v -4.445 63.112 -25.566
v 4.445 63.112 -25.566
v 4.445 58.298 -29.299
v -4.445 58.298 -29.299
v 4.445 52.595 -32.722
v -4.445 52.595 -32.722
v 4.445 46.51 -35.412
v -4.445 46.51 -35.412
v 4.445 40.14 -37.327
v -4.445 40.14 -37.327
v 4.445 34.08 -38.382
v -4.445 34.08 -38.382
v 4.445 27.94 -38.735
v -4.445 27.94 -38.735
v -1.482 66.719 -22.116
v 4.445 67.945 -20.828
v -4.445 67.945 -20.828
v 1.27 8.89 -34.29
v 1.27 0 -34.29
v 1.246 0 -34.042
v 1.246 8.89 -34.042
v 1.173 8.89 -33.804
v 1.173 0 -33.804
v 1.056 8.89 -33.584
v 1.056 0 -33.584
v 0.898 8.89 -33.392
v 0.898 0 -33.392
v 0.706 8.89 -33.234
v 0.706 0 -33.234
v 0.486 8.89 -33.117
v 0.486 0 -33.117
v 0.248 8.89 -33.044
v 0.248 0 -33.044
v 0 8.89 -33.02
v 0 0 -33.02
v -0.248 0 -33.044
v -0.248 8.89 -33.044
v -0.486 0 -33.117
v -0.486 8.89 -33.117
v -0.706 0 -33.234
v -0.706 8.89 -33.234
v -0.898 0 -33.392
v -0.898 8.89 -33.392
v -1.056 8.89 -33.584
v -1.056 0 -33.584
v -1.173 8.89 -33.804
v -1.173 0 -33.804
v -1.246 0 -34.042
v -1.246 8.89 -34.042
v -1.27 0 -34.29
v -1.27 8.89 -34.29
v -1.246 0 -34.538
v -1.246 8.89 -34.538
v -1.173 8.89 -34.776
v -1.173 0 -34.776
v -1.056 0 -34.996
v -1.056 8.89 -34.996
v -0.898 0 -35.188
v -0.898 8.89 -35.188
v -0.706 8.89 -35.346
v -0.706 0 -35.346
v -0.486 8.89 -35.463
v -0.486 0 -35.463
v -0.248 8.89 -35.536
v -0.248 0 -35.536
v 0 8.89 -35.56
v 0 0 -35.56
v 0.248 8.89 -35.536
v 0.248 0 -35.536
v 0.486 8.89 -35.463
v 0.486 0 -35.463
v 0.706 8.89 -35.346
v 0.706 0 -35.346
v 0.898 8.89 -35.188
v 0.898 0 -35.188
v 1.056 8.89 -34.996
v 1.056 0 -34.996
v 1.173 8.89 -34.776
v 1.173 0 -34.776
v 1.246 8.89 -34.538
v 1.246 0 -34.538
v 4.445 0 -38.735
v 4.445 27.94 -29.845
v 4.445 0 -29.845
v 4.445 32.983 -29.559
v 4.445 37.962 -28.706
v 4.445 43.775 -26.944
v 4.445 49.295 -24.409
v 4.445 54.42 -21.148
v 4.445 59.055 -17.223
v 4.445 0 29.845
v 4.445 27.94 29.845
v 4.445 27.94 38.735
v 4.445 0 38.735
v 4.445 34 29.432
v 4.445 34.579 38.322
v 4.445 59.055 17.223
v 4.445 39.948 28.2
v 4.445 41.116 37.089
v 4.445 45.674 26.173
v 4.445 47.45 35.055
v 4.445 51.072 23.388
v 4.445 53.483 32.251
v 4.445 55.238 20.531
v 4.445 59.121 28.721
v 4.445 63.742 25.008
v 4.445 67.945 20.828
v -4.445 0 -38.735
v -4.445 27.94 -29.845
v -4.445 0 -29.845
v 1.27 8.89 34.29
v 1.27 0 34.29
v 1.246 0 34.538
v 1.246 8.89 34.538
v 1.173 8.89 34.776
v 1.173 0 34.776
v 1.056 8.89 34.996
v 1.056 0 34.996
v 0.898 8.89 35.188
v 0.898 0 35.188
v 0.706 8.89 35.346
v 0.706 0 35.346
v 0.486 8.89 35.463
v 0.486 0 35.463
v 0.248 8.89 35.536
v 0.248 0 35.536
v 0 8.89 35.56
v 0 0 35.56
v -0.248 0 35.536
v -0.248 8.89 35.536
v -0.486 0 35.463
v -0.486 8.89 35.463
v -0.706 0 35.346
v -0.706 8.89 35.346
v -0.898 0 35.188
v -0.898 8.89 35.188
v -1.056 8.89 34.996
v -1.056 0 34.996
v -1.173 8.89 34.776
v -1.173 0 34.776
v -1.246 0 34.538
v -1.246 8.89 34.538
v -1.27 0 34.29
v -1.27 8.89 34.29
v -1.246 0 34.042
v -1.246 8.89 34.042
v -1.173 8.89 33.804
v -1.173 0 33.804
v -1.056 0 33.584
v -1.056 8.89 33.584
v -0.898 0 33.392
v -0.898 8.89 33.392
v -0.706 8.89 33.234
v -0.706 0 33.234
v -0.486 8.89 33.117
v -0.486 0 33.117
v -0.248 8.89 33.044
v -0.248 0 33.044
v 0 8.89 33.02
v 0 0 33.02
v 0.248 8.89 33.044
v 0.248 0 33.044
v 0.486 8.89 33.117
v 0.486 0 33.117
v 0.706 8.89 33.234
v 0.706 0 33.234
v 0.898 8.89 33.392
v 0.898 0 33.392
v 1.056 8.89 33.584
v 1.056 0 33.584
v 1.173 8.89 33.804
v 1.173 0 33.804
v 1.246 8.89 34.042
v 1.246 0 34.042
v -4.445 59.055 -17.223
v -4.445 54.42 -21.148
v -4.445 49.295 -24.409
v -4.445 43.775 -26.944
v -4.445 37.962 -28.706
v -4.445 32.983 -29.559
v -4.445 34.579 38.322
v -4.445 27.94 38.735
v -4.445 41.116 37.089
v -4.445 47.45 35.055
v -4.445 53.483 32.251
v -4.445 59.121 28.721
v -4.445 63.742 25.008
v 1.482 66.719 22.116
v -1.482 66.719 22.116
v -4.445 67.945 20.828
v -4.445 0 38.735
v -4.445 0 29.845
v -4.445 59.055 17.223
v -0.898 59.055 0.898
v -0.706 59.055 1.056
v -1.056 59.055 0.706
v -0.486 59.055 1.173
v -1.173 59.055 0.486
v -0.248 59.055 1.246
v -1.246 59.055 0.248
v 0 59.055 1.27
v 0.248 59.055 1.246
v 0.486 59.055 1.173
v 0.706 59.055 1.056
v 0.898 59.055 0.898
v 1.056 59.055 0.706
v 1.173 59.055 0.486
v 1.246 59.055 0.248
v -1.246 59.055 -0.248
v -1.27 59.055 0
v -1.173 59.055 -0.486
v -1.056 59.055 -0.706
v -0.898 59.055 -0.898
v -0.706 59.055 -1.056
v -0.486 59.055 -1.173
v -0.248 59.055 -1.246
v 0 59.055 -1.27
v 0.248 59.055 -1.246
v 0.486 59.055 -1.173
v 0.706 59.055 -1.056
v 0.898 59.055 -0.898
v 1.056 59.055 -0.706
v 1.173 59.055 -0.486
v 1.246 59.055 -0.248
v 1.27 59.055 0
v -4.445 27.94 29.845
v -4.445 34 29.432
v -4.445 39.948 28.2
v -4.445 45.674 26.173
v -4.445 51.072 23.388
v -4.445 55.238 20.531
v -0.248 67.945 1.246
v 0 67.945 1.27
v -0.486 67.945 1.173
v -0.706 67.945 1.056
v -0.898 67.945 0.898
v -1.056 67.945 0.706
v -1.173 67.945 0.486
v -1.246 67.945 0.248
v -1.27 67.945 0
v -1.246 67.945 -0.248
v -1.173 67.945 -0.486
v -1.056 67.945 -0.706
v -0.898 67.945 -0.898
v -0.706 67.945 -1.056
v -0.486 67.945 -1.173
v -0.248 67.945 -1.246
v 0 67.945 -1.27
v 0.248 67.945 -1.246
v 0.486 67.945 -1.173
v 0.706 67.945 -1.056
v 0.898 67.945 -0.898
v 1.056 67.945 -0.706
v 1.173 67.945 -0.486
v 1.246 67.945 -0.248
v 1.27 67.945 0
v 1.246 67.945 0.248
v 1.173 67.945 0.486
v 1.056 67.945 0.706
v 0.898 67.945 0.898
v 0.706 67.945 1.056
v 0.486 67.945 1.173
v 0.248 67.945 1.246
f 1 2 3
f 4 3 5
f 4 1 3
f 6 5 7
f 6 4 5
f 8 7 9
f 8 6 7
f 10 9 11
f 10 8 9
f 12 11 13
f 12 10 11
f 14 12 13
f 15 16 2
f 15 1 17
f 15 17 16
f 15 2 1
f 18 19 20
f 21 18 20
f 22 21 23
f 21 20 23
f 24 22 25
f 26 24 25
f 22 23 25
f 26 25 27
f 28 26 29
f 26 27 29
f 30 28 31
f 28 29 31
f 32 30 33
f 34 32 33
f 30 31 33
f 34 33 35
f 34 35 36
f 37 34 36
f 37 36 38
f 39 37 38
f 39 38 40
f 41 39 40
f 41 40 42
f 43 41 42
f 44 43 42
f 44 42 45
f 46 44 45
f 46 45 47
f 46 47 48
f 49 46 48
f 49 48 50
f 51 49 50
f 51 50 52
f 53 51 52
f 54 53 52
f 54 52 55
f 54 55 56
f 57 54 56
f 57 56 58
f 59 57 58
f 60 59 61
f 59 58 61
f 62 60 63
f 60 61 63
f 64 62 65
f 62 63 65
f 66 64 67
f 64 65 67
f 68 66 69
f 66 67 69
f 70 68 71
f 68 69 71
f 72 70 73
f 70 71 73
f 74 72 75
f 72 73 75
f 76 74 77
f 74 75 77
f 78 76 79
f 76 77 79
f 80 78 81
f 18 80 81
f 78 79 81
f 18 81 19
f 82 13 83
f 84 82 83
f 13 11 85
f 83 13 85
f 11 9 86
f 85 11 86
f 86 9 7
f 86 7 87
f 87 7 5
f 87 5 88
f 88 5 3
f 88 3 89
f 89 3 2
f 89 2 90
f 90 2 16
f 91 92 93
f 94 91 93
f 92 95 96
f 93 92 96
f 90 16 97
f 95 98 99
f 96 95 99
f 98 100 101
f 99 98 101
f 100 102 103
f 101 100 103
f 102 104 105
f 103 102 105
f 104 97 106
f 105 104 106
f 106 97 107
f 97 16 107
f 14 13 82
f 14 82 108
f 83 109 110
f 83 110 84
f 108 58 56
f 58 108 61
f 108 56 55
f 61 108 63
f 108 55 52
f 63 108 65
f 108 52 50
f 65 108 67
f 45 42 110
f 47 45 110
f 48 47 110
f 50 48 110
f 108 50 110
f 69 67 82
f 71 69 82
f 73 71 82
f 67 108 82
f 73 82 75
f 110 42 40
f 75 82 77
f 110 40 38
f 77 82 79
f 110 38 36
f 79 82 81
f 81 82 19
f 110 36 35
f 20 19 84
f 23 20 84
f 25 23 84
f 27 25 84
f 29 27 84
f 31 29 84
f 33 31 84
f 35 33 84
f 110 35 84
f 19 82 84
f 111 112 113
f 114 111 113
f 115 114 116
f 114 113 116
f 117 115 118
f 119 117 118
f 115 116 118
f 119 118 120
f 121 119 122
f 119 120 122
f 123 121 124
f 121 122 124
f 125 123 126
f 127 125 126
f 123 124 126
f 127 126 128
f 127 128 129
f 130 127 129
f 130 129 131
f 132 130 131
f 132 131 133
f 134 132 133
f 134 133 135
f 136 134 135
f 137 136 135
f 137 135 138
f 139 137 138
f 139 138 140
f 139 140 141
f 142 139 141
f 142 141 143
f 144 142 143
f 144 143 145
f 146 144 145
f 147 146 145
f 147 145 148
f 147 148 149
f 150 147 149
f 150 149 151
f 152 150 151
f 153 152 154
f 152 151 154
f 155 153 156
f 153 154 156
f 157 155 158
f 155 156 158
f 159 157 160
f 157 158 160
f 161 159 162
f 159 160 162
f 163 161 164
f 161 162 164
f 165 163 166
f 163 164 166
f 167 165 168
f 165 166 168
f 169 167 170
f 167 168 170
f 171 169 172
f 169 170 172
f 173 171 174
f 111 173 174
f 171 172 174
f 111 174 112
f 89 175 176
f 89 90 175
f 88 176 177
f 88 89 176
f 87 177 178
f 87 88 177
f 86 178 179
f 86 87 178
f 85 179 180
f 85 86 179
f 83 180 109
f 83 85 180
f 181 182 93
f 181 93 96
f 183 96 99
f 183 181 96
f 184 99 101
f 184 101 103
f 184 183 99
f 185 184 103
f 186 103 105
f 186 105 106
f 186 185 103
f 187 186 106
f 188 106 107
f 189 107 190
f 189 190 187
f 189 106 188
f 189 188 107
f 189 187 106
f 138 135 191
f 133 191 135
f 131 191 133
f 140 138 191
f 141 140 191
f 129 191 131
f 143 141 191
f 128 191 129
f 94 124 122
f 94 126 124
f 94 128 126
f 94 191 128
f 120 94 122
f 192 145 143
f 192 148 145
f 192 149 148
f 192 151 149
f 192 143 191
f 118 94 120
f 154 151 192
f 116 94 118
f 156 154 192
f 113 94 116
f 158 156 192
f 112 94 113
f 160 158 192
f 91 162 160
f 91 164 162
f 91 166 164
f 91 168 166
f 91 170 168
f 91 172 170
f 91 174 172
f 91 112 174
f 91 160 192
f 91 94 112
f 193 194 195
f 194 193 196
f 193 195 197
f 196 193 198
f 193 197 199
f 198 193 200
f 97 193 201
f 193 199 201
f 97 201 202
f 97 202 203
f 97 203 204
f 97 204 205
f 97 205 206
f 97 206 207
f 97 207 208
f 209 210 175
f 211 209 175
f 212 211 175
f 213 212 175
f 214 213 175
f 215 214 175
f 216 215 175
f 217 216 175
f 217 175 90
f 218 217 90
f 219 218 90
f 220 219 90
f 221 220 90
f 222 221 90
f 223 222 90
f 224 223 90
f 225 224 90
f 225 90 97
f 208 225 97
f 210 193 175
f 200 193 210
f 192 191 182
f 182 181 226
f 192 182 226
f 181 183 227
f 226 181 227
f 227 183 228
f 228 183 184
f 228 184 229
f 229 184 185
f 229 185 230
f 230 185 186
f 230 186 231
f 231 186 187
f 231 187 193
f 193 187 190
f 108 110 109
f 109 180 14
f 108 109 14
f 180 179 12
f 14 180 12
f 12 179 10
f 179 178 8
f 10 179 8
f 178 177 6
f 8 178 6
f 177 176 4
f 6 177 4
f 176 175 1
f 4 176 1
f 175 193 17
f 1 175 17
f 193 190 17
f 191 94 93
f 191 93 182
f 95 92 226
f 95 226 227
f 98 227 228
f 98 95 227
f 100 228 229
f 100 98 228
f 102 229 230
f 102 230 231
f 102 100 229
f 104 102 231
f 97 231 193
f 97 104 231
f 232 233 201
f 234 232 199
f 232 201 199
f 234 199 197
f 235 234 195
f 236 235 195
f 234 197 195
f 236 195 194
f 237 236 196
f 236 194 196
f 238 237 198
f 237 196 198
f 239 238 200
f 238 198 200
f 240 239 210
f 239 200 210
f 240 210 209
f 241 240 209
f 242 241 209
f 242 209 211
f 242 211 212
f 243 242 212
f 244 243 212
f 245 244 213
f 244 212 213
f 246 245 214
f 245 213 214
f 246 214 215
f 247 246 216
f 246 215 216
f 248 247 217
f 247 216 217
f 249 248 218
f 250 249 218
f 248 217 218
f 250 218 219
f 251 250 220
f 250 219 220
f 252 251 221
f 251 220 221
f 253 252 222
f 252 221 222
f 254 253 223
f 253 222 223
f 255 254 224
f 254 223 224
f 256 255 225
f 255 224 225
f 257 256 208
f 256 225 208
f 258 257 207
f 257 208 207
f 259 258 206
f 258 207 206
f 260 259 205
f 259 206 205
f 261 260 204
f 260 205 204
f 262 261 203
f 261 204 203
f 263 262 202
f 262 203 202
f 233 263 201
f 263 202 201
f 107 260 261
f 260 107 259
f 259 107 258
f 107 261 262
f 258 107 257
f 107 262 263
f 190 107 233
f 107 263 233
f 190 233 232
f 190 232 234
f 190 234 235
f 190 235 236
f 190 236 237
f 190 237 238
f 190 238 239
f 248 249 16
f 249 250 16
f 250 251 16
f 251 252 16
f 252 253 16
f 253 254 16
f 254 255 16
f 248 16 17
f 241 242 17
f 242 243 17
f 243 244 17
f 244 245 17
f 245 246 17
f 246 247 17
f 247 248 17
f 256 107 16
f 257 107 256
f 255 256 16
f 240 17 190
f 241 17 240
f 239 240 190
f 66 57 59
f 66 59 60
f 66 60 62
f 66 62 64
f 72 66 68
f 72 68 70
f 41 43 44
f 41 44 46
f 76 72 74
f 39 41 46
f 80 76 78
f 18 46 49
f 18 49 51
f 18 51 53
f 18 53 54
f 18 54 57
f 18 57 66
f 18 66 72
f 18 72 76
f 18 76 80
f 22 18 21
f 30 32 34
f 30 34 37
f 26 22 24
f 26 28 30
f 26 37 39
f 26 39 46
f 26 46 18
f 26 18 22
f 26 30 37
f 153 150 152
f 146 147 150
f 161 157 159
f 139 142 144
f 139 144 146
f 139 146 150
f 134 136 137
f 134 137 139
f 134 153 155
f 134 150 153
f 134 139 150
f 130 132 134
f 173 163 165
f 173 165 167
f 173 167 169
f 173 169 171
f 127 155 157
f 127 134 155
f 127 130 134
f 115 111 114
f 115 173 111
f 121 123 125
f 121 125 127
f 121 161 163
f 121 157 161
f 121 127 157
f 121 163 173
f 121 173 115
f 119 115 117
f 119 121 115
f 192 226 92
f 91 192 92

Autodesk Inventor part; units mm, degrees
ref_plane "YZ Plane" through (0, 0, 0) normal (1, 0, 0) x (0, 1, 0)
ref_plane "XZ Plane" through (0, 0, 0) normal (0, 1, 0) x (-1, 0, 0)
ref_plane "XY Plane" through (0, 0, 0) normal (0, 0, 1) x (1, 0, 0)
sketch "Sketch1" plane through (0, 0, 0) normal (0, 1, 0) x (-1, 0, 0)
  line L0 (0, 34.29) -> (0, -34.29) construction
  line L1 (-4.445, 38.735) -> (4.445, 38.735)
  line L2 (4.445, 38.735) -> (4.445, 29.845)
  line L3 (4.445, 29.845) -> (-4.445, 29.845)
  line L4 (-4.445, 29.845) -> (-4.445, 38.735)
  line L5 (-4.445, 38.735) -> (4.445, 29.845) construction
  line L6 (4.445, 38.735) -> (-4.445, 29.845) construction
  line L7 (-4.445, -29.845) -> (4.445, -29.845)
  line L8 (4.445, -29.845) -> (4.445, -38.735)
  line L9 (4.445, -38.735) -> (-4.445, -38.735)
  line L10 (-4.445, -38.735) -> (-4.445, -29.845)
  line L11 (-4.445, -29.845) -> (4.445, -38.735) construction
  line L12 (4.445, -29.845) -> (-4.445, -38.735) construction
  point P0 (0, 0)
  point P1 (0, 0)
  dimension "d0" = 68.58
  dimension "d1" = 8.89
  dimension "d2" = 8.89
  dimension "d3" = 8.89
sketch "Sketch2" plane through (0, 0, 0) normal (1, 0, 0) x (0, 1, 0)
  line L0 (0, 0) -> (63.5, 0) construction
  line L1 (0, 34.29) -> (27.94, 34.29)
  line L2 (0, -34.29) -> (27.94, -34.29)
  line L3 (63.5, 19.05) -> (63.5, -19.05)
  arc A0 (63.5, 19.05) -> (27.94, 34.29) centre (27.94, -14.8167) ccw
  arc A1 (27.94, -34.29) -> (63.5, -19.05) centre (27.94, 14.8167) ccw
  dimension "d4" = 63.5
  dimension "d21" = 38.1
  dimension "d22" = 27.94
  dimension "d23" = 27.94
sweep "Sweep1" add profiles "Sketch1" path "Sketch2" contours L7 L8 L9 L10
sketch "Sketch3" plane through (-4.445, 0, -29.845) normal (0, -1, 0) x (1, 0, 0)
  line L0 (0, 0) -> (0, -8.89) projected
  circle A0 centre (4.445, -4.445) radius 1.27
  line L1 (0, 68.58) -> (0, 59.69) projected
  circle A1 centre (4.445, 64.135) radius 1.27
  point P0 (4.445, 29.845)
  dimension "d10" = 2.54
  dimension "d11" = 2.54
  dimension "d12" = 4.445
  dimension "d13" = 34.29
  dimension "d14" = 4.445
  dimension "d15" = 34.29
extrude "Extrusion1" cut sketch "Sketch3" against normal blind 8.89
sketch "Sketch5" plane through (-4.445, 67.945, 20.828) normal (0, 1, 0) x (1, 0, 0)
  circle A0 centre (4.445, 20.828) radius 1.27
  dimension "d24" = 2.54
hole "Hole1" at (0, 67.945, 0) direction (0, -1, 0) diameter 2.54 end through all
properties part number "hpart"
